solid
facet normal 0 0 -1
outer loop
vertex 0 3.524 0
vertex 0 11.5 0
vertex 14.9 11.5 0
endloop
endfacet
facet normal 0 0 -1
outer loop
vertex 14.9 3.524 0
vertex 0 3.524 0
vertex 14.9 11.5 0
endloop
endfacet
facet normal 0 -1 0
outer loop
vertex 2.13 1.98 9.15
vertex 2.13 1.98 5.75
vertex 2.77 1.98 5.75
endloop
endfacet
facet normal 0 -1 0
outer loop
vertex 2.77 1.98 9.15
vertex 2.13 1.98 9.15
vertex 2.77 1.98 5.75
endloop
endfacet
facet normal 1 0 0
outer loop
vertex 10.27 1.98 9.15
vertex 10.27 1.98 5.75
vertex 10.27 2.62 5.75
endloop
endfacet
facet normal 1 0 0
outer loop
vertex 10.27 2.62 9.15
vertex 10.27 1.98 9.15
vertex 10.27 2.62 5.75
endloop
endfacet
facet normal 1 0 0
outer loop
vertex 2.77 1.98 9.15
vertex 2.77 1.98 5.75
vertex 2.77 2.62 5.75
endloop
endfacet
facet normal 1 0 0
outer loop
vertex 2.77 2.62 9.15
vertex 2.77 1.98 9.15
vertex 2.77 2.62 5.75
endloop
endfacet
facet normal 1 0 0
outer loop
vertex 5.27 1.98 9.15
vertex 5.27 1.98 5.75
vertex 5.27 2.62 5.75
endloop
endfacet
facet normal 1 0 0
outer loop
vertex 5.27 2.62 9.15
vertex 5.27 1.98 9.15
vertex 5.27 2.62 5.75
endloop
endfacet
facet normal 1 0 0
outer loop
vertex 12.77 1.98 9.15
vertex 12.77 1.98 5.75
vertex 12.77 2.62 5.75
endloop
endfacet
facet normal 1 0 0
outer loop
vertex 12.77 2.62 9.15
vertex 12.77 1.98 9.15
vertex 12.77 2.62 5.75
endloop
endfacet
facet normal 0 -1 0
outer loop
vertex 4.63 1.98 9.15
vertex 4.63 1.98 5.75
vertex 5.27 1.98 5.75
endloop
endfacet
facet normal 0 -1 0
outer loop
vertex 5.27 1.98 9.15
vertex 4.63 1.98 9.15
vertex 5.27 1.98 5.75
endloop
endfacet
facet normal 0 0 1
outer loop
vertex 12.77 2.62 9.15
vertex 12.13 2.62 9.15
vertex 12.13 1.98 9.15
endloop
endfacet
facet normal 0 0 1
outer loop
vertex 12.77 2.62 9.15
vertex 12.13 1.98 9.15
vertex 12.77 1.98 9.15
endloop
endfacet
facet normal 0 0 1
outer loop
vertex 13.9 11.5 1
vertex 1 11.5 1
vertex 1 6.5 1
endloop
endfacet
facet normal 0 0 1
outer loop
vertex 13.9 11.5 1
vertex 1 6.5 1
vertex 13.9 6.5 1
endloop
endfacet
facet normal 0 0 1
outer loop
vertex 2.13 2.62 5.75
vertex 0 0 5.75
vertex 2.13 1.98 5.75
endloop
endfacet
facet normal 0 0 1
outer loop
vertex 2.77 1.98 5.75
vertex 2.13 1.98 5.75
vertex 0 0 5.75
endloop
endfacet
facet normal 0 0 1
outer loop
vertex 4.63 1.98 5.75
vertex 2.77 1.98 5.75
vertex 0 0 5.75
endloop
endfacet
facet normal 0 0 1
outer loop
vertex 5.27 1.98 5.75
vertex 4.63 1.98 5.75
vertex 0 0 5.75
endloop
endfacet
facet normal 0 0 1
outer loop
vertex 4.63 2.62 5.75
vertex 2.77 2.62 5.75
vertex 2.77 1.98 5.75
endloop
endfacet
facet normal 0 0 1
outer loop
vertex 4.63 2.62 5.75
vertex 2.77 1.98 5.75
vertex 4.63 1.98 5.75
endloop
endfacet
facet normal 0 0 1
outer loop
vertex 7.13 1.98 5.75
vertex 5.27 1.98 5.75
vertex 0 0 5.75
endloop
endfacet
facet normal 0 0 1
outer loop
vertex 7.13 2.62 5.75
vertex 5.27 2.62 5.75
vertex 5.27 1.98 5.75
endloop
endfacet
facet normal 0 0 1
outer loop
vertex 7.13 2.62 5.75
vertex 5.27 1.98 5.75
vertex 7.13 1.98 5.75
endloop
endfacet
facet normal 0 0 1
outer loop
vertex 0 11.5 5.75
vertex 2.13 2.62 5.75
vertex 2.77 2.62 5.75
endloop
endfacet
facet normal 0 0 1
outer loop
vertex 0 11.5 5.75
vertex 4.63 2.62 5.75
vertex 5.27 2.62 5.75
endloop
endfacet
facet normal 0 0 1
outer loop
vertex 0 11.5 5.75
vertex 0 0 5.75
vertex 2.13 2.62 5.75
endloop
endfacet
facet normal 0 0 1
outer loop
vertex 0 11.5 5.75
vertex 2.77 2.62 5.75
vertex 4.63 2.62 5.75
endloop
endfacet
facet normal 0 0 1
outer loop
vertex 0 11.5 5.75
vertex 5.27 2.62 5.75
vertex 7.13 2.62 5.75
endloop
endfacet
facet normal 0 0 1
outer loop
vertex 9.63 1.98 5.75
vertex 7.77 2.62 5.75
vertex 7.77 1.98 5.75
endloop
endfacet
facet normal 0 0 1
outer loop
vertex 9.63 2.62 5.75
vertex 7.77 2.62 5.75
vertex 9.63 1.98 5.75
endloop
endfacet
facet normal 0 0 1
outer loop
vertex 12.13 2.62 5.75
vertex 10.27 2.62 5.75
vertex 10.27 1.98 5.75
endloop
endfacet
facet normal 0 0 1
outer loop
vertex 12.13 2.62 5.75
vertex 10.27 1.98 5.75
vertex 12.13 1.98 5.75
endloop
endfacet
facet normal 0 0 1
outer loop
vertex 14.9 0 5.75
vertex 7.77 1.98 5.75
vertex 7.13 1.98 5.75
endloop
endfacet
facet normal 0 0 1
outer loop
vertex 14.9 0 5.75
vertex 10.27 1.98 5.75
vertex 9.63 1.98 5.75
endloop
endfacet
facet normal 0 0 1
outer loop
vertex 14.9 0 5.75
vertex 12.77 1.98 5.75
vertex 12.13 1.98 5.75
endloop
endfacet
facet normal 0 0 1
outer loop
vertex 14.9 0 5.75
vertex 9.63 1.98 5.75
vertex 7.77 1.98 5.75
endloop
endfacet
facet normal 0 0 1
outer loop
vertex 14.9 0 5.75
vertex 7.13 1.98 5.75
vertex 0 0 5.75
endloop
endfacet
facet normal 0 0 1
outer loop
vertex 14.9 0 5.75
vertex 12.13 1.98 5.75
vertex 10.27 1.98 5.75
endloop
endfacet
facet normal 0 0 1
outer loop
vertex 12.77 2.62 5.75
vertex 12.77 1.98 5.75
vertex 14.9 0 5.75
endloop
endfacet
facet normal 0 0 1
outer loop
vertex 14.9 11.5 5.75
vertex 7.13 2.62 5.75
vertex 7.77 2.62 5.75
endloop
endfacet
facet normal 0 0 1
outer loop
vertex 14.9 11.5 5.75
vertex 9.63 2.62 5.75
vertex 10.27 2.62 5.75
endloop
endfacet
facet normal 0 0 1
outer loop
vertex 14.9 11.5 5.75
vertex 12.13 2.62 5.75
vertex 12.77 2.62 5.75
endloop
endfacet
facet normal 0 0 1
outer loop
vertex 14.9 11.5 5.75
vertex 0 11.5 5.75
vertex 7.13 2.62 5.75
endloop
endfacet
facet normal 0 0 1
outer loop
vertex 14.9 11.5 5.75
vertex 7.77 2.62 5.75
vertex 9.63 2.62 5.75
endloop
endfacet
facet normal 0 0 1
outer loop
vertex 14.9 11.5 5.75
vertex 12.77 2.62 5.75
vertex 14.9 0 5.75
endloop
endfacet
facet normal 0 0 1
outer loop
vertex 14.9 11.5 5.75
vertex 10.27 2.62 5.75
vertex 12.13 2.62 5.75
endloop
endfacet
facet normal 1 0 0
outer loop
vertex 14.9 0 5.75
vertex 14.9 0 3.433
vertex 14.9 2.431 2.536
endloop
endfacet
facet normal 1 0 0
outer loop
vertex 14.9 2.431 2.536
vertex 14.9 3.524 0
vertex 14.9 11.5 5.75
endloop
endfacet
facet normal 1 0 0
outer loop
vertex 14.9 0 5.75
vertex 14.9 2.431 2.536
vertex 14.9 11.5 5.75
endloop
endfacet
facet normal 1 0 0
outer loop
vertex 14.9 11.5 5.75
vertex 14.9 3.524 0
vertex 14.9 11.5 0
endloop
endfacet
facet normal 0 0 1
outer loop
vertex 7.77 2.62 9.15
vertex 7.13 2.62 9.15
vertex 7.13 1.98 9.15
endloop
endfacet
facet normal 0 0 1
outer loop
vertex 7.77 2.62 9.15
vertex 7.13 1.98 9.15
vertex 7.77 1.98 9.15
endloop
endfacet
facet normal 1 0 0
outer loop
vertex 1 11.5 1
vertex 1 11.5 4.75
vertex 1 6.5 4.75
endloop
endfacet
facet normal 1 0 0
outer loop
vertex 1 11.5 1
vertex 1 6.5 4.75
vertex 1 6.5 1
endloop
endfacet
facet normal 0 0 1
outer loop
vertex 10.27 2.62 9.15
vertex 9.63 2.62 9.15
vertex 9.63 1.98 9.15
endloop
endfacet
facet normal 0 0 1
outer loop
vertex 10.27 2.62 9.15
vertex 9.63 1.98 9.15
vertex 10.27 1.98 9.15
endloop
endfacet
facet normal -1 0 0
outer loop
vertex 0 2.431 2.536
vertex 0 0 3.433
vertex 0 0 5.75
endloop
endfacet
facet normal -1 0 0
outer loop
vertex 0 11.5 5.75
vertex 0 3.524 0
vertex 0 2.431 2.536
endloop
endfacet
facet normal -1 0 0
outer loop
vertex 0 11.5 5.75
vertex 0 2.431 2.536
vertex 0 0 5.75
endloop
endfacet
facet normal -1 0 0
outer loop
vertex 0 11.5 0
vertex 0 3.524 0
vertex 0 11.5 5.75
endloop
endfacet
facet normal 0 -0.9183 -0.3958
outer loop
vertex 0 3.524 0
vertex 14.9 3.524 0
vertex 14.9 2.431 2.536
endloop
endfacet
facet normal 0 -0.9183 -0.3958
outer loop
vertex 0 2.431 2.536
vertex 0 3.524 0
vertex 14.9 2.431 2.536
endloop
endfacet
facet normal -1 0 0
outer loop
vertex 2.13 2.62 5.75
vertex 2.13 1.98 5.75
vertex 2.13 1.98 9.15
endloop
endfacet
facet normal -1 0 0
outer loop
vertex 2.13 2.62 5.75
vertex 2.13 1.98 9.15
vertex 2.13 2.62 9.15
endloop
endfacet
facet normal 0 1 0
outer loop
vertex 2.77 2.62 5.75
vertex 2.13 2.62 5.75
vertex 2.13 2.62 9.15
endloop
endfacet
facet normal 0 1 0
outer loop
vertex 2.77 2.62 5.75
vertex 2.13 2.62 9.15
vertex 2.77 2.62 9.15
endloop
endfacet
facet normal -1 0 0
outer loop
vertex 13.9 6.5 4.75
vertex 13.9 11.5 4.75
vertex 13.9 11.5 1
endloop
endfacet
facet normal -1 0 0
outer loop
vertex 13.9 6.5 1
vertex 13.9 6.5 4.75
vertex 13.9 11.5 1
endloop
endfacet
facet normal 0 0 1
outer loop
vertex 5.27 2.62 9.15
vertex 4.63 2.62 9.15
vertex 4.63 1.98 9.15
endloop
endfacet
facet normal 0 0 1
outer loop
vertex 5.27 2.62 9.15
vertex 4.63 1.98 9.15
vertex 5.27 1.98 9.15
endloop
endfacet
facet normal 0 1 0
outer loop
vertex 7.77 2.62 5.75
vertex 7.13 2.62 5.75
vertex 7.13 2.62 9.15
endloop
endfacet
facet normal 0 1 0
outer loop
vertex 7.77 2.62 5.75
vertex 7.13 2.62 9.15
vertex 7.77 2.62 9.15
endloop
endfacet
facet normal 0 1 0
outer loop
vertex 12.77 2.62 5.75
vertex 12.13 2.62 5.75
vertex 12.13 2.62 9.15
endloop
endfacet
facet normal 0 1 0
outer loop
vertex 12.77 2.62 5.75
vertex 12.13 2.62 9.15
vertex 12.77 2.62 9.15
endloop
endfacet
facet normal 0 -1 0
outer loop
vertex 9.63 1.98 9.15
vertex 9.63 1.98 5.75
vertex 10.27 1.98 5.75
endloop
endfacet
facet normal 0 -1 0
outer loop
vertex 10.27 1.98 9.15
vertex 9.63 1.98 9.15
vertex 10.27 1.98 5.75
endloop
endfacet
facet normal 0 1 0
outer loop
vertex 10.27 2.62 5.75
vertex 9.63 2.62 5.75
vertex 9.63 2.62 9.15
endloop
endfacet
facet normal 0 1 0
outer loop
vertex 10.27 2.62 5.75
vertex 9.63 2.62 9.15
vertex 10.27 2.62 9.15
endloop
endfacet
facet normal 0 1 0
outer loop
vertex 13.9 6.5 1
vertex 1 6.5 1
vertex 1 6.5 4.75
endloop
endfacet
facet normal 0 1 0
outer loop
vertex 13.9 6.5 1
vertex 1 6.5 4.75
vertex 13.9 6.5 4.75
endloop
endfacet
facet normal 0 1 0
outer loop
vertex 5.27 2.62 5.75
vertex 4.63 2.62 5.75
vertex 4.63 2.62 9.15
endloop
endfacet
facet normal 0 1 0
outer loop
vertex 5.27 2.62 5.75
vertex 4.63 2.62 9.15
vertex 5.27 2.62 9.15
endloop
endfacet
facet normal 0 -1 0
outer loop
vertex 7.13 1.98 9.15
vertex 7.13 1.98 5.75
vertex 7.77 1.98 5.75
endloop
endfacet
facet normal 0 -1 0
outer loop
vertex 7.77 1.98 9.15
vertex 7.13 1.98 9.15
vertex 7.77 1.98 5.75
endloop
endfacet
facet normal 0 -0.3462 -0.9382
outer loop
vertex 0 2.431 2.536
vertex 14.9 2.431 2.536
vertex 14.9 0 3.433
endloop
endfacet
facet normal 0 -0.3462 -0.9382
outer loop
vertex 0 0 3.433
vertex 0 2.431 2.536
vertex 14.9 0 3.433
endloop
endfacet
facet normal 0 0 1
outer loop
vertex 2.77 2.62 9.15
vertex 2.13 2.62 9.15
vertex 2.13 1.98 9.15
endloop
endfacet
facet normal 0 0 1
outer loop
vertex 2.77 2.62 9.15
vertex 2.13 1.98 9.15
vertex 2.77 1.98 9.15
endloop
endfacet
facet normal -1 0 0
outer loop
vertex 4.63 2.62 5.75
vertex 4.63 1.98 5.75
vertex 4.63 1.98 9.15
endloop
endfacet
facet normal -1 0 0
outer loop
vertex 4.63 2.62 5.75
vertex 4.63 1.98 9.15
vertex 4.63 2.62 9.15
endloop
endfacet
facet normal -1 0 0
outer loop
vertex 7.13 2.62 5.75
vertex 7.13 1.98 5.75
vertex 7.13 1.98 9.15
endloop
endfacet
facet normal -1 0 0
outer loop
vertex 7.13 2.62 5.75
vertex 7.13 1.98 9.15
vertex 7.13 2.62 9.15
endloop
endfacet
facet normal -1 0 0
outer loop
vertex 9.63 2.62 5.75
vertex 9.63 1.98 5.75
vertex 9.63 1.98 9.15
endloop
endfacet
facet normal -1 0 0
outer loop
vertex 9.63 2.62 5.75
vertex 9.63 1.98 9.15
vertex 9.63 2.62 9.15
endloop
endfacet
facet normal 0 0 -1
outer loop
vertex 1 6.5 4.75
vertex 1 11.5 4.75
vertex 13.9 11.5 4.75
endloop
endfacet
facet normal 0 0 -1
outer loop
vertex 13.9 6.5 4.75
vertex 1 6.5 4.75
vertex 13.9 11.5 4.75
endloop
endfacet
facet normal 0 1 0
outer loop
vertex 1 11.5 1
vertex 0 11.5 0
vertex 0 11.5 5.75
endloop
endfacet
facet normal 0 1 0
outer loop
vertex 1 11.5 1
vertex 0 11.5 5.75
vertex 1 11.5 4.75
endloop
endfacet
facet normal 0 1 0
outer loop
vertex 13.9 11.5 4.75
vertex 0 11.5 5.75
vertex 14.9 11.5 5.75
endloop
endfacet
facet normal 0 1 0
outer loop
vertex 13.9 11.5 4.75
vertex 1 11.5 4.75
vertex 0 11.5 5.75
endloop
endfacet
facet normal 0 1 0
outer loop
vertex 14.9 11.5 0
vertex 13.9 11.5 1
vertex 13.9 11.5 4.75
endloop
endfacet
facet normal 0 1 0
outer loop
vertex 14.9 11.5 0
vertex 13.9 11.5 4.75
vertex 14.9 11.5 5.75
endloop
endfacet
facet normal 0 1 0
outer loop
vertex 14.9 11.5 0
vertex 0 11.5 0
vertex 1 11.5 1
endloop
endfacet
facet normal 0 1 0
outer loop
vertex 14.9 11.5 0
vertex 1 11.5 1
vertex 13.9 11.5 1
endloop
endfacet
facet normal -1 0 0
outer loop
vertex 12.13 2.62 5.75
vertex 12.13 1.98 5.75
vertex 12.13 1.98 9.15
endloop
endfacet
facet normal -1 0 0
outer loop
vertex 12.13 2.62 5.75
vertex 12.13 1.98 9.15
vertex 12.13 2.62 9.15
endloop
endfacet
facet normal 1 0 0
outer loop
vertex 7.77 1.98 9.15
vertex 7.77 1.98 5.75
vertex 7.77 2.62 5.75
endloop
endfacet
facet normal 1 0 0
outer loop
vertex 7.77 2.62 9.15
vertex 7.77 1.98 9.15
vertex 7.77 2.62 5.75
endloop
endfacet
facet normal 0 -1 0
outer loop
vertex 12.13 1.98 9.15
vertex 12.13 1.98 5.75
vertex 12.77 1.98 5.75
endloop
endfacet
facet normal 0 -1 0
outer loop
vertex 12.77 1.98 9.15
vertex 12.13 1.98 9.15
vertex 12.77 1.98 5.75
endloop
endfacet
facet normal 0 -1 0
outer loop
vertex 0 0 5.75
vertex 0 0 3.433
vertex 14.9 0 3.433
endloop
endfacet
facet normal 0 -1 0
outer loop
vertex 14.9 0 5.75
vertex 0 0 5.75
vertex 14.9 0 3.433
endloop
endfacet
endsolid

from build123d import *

# Parameters (mm, degrees)
SKETCH_1_W          = 14.9
SKETCH_1_H          = 11.5
EXTRUDE_1_DEPTH     = 5.75
SKETCH_2_W          = 0.64
SKETCH_2_H          = 0.64
EXTRUDE_2_DEPTH     = 3.4
CUT_EXTRUDE_1_DEPTH = 21.928031441
SKETCH_4_W          = 12.9
SKETCH_4_H          = 3.75
CUT_EXTRUDE_2_DEPTH = 5


with BuildPart() as part:
    # Эскиз1 → Бобышка-Вытянуть1 (new body)
    with BuildSketch(Plane.XY):
        with Locations((7.45, 5.75)):
            Rectangle(SKETCH_1_W, SKETCH_1_H)
    extrude(amount=EXTRUDE_1_DEPTH)

    # Эскиз2 → Бобышка-Вытянуть2 (add)
    with BuildSketch(Plane.XY.offset(5.75)):
        with Locations((4.95, 2.3)):
            Rectangle(SKETCH_2_W, SKETCH_2_H)
        with Locations((2.45, 2.3)):
            Rectangle(SKETCH_2_W, SKETCH_2_H)
        with Locations((7.45, 2.3)):
            Rectangle(SKETCH_2_W, SKETCH_2_H)
        with Locations((9.95, 2.3)):
            Rectangle(SKETCH_2_W, SKETCH_2_H)
        with Locations((12.45, 2.3)):
            Rectangle(SKETCH_2_W, SKETCH_2_H)
    extrude(amount=EXTRUDE_2_DEPTH)

    # Эскиз3 → Вырез-Вытянуть1 (cut, through all)
    with BuildSketch(Plane.ZY):
        Polygon((0, 0), (0, 3.523806865), (2.536361598, 2.431096681), (3.433362495, 0), align=None)
    extrude(amount=-CUT_EXTRUDE_1_DEPTH, mode=Mode.SUBTRACT)

    # Эскиз4 → Вырез-Вытянуть2 (cut)
    with BuildSketch(Plane(origin=(0, 11.5, 0), x_dir=(1, 0, 0), z_dir=(0, 1, 0))):
        with Locations((7.45, -2.875)):
            Rectangle(SKETCH_4_W, SKETCH_4_H)
    extrude(amount=-CUT_EXTRUDE_2_DEPTH, mode=Mode.SUBTRACT)


solid = part.part
